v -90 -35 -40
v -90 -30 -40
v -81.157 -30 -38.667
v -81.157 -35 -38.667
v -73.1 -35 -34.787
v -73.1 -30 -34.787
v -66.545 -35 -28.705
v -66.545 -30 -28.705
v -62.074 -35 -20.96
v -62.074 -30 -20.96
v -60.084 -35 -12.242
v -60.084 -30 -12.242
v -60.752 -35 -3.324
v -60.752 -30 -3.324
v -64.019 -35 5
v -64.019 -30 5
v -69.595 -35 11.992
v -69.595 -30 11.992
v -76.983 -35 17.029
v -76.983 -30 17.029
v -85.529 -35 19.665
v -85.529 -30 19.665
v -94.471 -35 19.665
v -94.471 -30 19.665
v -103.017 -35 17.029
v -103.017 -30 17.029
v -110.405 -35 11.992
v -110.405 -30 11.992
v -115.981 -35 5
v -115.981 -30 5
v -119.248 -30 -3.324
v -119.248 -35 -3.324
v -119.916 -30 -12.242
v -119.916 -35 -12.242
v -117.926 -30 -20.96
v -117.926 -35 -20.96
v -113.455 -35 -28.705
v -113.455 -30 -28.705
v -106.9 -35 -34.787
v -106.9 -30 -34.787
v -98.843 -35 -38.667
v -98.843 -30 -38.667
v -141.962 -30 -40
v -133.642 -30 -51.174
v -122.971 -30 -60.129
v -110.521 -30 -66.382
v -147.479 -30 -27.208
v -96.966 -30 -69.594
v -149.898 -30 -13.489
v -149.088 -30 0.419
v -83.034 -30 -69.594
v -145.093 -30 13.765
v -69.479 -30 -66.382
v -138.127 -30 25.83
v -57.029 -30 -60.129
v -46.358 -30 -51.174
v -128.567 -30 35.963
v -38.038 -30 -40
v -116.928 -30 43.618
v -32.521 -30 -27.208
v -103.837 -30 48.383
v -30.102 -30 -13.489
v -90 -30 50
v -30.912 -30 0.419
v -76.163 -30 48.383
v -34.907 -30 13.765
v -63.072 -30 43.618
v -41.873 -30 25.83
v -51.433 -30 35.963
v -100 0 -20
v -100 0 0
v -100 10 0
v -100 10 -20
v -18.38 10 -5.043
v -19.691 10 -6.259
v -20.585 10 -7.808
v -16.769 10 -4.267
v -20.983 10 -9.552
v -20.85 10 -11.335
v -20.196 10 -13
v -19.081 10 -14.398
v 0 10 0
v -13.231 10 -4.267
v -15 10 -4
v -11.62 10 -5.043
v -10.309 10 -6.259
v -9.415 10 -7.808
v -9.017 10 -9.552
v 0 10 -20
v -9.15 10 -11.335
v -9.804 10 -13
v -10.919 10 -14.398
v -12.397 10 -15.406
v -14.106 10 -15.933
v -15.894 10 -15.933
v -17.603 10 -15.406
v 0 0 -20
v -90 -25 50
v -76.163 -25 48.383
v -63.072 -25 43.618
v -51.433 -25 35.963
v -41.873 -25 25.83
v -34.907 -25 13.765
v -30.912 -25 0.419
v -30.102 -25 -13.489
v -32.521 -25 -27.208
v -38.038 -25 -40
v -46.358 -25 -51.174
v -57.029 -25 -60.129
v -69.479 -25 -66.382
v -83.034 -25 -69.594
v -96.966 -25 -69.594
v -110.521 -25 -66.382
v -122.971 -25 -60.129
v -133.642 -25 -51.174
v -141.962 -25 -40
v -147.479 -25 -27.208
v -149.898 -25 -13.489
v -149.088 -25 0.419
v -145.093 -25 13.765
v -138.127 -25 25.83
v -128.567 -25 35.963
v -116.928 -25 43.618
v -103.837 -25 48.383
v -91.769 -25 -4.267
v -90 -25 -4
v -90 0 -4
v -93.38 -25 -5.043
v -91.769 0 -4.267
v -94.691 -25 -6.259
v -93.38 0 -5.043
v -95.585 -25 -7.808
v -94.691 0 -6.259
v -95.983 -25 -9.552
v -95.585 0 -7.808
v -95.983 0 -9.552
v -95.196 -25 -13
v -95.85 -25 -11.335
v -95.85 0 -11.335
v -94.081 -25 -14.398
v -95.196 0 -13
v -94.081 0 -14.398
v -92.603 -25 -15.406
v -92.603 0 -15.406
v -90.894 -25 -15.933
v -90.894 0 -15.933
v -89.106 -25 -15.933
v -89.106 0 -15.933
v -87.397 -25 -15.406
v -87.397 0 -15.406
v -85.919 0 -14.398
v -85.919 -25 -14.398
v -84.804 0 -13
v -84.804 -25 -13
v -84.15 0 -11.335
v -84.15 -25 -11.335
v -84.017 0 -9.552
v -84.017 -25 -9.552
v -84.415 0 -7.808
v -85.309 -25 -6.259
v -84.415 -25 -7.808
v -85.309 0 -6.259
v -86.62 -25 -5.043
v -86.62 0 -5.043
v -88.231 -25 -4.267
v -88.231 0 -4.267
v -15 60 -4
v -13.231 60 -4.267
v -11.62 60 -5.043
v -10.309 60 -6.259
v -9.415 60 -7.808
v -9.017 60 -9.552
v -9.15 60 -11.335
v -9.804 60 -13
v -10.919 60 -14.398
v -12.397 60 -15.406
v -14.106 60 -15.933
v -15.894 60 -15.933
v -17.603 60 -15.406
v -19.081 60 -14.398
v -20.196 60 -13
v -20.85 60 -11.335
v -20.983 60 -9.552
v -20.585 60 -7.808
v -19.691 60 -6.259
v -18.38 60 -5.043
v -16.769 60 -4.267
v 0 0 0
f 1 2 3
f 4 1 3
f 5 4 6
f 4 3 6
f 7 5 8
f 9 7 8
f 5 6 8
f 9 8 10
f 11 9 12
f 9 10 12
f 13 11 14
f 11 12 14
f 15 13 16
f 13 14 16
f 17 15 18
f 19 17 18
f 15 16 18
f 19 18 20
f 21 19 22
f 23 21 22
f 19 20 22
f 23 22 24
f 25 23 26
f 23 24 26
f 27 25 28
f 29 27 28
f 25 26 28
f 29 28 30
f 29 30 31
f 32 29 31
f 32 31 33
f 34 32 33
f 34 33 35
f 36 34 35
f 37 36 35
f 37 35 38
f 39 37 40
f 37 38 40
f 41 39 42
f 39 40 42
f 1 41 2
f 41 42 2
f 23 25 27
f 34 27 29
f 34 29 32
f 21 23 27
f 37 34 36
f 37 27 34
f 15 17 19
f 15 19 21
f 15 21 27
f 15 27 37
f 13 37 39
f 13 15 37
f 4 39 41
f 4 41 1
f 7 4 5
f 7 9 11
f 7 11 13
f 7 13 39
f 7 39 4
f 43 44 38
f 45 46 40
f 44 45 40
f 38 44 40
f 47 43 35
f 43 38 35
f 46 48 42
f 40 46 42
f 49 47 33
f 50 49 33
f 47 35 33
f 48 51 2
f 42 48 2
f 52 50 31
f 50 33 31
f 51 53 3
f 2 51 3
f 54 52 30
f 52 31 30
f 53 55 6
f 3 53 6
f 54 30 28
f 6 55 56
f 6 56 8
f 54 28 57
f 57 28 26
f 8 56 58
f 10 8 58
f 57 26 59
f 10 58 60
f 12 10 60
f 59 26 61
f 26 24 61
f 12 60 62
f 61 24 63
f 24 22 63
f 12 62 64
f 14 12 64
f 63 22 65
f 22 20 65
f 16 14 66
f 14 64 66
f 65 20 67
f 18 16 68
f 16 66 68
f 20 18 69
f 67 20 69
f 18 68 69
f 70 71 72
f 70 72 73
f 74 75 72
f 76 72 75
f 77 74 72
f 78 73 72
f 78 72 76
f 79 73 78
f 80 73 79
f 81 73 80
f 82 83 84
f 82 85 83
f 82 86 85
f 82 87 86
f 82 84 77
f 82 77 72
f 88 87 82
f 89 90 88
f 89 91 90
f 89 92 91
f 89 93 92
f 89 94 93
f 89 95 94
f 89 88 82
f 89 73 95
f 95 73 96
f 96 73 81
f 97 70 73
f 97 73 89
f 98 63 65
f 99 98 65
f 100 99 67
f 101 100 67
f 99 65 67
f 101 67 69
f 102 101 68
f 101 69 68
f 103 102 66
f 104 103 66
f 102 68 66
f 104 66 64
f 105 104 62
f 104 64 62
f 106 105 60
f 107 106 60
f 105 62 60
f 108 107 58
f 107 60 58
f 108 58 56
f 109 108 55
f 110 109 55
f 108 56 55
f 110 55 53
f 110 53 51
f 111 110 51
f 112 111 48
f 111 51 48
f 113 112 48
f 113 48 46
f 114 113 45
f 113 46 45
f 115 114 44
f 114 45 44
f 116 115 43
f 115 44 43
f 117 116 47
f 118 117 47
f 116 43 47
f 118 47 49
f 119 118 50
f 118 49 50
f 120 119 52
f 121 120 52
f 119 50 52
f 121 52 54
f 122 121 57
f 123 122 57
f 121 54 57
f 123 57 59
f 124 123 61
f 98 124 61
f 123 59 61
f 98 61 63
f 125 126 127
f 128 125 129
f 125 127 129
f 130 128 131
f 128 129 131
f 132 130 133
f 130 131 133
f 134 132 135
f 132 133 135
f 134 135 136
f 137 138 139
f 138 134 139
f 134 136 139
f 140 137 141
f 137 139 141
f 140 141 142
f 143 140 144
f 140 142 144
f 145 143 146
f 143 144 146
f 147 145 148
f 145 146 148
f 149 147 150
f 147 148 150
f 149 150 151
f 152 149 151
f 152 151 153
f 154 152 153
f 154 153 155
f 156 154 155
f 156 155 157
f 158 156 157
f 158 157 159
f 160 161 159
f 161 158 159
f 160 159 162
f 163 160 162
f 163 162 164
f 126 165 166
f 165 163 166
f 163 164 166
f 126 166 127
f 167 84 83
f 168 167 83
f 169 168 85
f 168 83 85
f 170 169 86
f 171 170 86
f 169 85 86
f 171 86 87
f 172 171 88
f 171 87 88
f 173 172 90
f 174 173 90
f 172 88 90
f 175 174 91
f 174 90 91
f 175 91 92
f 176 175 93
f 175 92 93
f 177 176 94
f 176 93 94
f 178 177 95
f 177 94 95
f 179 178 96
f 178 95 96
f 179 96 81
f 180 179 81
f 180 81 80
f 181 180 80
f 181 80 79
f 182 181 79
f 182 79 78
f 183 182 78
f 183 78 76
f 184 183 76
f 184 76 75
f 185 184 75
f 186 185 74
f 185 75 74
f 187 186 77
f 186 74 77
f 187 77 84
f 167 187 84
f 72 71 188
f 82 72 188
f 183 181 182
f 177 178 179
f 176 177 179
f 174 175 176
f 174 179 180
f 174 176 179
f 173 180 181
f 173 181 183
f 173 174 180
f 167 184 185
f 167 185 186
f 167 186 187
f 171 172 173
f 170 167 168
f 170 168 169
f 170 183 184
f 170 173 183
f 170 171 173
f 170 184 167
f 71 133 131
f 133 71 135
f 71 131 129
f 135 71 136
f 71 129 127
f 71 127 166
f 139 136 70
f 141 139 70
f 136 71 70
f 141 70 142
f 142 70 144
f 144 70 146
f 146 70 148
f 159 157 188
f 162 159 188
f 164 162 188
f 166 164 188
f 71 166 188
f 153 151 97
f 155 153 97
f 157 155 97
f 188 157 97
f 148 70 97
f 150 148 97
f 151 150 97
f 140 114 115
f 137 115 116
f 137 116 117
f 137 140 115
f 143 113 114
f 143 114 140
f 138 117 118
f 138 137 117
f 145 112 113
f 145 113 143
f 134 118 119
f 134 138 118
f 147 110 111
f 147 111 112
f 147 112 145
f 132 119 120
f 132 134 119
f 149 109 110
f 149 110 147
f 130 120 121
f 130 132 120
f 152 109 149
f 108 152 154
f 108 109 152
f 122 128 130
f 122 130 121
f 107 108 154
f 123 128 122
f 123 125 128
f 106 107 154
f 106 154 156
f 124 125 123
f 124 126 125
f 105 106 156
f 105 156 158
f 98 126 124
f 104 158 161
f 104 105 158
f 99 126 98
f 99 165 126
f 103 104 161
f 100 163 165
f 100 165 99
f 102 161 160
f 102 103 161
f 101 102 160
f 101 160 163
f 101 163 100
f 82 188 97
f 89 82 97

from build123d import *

# Parameters (mm, degrees)
SKETCH_1_W      = 100
SKETCH_1_H      = 20
EXTRUDE_1_DEPTH = 10
SKETCH_4_R      = 6
EXTRUDE_2_DEPTH = 50
SKETCH_6_R      = 6
EXTRUDE_3_DEPTH = 30
SKETCH_7_R      = 30
EXTRUDE_4_DEPTH = 5
SKETCH_8_R      = 60
EXTRUDE_5_DEPTH = 5


with BuildPart() as part:
    # ｽｹｯﾁ1 → ﾎﾞｽ - 押し出し1 (new body)
    with BuildSketch(Plane(origin=(0, 0, 0), x_dir=(1, 0, 0), z_dir=(0, 1, 0))):
        with Locations((-50, 10)):
            Rectangle(SKETCH_1_W, SKETCH_1_H)
    extrude(amount=EXTRUDE_1_DEPTH)

    # ｽｹｯﾁ4 → ﾎﾞｽ - 押し出し2 (add)
    with BuildSketch(Plane(origin=(0, 10, 0), x_dir=(1, 0, 0), z_dir=(0, 1, 0))):
        with Locations(Location((-15, 10, 0), (0, 0, 270))):
            Circle(SKETCH_4_R)
    extrude(amount=EXTRUDE_2_DEPTH)

    # ｽｹｯﾁ6 → ﾎﾞｽ - 押し出し3 (add)
    with BuildSketch(Plane.XZ):
        with Locations(Location((-90, -10, 0), (0, 0, 90))):
            Circle(SKETCH_6_R)
    extrude(amount=EXTRUDE_3_DEPTH)

    # ｽｹｯﾁ7 → ﾎﾞｽ - 押し出し4 (add)
    with BuildSketch(Plane.XZ.offset(30)):
        with Locations(Location((-90, -10, 0), (0, 0, 270))):
            Circle(SKETCH_7_R)
    extrude(amount=EXTRUDE_4_DEPTH)

    # ｽｹｯﾁ8 → ﾎﾞｽ - 押し出し5 (add)
    with BuildSketch(Plane(origin=(0, -30, 0), x_dir=(1, 0, 0), z_dir=(0, 1, 0))):
        with Locations(Location((-90, 10, 0), (0, 0, 270))):
            Circle(SKETCH_8_R)
    extrude(amount=EXTRUDE_5_DEPTH)


solid = part.part
